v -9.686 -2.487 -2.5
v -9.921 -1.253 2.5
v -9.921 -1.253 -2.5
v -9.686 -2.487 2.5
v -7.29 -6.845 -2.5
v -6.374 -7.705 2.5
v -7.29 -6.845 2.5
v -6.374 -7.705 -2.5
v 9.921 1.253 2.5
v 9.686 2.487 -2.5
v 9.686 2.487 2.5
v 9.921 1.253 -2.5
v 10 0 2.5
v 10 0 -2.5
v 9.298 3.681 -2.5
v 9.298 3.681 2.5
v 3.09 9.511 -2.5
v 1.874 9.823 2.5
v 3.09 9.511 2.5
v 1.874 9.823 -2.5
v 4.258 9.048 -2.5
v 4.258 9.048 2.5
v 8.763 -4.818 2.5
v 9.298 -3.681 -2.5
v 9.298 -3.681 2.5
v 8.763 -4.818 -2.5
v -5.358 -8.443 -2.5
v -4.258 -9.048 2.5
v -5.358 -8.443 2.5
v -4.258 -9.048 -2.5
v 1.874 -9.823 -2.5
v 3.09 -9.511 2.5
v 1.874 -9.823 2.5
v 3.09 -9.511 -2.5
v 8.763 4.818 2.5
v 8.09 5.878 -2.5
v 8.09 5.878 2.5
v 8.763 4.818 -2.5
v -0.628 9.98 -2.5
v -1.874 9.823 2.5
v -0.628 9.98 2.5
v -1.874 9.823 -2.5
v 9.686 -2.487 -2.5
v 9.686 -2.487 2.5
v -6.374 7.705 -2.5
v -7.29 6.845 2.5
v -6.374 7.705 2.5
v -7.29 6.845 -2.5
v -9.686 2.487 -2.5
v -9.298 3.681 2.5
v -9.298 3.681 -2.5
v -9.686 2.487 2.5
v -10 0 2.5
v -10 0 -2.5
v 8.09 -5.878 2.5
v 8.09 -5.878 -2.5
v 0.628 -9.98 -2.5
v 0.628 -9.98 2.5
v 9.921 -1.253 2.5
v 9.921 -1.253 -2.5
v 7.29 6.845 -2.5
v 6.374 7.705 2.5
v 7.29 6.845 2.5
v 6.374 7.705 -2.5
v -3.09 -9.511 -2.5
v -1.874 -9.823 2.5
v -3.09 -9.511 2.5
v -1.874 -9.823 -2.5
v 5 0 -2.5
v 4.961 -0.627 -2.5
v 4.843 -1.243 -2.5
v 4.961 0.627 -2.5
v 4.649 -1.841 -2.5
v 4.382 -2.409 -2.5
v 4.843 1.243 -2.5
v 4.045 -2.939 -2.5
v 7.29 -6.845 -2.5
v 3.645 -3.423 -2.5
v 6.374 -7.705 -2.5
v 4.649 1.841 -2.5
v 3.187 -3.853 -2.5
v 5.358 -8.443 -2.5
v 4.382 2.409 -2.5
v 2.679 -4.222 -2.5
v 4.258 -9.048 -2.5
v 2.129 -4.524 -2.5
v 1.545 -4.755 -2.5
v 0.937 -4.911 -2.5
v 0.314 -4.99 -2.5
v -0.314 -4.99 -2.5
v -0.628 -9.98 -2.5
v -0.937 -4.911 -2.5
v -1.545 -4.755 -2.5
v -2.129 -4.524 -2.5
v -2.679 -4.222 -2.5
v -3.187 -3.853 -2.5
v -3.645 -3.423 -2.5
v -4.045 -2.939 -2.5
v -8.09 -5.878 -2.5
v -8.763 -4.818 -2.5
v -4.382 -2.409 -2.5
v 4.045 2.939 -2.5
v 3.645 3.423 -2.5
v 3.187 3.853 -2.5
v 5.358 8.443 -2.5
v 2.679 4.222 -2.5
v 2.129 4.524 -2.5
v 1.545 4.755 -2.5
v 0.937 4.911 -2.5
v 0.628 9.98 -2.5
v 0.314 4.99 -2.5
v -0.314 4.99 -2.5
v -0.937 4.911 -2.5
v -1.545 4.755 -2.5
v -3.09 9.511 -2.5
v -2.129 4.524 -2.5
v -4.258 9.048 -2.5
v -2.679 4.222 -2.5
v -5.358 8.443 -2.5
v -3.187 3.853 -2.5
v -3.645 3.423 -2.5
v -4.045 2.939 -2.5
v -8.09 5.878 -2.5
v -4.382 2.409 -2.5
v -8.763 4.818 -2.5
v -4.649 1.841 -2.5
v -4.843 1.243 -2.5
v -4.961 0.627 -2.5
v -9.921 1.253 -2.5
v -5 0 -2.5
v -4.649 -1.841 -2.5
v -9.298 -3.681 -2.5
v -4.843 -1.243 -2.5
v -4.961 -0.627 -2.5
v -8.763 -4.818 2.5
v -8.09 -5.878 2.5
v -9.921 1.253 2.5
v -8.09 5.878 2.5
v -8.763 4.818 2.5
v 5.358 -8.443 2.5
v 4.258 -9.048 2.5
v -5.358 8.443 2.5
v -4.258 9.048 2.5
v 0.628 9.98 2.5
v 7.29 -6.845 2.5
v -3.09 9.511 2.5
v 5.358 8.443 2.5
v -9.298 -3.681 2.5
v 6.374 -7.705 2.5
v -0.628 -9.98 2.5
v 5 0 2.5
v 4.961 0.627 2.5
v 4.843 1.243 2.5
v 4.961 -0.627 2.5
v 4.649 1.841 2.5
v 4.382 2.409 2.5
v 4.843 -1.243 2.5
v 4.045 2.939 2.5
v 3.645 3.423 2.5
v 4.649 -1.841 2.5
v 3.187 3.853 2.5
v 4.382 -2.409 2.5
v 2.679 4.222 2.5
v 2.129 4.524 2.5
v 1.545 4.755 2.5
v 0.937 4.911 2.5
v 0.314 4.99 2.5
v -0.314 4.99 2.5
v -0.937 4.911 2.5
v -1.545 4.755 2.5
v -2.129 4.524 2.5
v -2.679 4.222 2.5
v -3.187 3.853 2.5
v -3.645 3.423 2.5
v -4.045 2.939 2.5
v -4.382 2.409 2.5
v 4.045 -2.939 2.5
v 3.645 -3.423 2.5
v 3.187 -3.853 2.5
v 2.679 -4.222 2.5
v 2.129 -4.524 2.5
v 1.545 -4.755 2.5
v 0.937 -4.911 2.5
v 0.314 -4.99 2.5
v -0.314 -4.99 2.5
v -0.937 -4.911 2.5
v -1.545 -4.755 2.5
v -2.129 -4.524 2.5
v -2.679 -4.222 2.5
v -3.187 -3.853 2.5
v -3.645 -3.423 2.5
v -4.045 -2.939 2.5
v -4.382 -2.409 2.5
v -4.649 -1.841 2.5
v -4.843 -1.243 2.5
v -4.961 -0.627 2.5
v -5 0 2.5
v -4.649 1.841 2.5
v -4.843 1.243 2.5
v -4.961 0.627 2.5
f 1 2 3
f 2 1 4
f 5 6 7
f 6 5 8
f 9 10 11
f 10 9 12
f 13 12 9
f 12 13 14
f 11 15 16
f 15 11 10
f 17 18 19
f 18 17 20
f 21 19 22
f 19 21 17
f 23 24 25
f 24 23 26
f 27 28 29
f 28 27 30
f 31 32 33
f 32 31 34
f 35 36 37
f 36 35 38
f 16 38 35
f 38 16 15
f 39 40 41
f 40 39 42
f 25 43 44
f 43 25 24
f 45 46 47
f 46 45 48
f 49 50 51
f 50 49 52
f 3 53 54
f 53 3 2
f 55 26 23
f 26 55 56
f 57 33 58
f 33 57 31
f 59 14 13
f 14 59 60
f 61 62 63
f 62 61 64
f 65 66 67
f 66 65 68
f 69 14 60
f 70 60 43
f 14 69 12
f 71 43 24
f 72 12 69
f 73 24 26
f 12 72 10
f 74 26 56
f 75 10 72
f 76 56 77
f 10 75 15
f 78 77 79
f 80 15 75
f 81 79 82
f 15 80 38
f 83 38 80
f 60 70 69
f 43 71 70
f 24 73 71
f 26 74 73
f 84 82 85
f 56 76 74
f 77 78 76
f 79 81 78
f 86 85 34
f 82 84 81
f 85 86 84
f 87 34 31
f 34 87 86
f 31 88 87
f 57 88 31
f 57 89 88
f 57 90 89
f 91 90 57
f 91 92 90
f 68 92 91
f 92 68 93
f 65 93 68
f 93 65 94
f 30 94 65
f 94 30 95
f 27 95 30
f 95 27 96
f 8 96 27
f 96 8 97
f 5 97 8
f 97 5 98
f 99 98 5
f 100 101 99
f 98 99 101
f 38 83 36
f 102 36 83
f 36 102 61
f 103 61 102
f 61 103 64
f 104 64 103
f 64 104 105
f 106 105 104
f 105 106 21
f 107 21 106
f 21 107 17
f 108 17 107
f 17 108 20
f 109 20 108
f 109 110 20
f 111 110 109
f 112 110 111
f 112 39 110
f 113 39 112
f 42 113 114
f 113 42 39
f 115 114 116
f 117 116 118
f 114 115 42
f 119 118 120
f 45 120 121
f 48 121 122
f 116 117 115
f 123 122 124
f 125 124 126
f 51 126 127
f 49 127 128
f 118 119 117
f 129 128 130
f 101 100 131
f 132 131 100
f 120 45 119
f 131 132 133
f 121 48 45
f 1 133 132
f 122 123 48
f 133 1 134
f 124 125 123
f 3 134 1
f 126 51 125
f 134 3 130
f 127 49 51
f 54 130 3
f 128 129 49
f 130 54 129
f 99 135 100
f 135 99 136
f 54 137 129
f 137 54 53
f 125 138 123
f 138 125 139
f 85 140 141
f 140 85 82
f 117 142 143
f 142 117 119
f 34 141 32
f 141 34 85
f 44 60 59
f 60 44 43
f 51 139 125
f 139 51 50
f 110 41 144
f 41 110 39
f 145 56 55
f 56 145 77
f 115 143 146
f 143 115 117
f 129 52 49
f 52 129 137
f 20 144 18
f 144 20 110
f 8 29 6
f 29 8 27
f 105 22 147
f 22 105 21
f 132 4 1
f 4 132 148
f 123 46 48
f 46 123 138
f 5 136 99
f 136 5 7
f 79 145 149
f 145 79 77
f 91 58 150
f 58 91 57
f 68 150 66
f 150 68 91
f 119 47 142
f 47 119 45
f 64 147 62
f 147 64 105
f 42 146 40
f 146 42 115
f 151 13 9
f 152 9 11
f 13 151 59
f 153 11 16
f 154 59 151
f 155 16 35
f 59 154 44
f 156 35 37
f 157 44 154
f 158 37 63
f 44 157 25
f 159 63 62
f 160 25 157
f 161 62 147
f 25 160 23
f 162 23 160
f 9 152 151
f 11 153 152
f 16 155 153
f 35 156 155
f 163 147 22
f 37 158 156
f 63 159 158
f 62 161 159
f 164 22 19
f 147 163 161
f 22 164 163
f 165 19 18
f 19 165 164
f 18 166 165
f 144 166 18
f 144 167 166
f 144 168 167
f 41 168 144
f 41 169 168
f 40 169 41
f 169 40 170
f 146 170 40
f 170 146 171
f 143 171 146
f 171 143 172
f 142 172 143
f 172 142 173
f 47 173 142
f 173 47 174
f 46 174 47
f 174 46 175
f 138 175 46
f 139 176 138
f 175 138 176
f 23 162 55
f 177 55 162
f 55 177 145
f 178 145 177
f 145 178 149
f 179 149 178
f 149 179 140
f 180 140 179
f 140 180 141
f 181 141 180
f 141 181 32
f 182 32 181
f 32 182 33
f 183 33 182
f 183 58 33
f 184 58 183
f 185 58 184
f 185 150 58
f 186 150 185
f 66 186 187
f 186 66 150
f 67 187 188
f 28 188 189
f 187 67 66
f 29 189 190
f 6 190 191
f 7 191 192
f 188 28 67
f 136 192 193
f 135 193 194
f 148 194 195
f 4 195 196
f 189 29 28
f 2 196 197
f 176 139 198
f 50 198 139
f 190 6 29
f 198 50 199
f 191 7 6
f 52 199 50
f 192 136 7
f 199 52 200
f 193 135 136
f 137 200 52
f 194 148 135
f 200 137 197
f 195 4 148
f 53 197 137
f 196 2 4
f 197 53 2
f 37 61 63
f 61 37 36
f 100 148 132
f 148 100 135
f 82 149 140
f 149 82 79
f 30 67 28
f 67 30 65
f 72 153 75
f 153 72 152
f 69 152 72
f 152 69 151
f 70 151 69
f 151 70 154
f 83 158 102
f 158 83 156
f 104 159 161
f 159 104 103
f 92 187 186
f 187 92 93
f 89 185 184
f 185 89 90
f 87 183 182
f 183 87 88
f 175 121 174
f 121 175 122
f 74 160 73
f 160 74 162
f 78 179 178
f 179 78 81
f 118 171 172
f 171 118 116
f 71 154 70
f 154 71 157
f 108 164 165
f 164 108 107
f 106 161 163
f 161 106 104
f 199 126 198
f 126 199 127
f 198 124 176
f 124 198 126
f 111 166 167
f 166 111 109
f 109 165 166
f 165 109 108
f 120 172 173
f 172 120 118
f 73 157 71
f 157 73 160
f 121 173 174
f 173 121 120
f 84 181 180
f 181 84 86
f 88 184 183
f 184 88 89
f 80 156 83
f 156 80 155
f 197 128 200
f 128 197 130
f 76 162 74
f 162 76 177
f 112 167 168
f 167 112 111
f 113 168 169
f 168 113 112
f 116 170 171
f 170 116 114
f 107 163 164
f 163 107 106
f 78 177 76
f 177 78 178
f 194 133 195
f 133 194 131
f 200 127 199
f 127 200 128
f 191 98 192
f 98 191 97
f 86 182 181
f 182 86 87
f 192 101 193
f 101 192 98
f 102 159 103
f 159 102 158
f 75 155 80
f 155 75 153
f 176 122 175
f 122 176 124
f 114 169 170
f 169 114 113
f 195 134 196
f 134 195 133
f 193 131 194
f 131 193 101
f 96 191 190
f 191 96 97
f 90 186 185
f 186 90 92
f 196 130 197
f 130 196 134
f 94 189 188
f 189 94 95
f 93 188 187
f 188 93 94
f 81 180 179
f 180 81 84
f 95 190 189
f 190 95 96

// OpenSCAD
$fn = 50;


difference() {
	union() {
		translate(v = [0, 0, -2.5000000000]) {
			cylinder(h = 5, r = 10.0000000000);
		}
	}
	union() {
		translate(v = [0, 0, -100.0000000000]) {
			cylinder(h = 200, r = 5.0000000000);
		}
	}
}
